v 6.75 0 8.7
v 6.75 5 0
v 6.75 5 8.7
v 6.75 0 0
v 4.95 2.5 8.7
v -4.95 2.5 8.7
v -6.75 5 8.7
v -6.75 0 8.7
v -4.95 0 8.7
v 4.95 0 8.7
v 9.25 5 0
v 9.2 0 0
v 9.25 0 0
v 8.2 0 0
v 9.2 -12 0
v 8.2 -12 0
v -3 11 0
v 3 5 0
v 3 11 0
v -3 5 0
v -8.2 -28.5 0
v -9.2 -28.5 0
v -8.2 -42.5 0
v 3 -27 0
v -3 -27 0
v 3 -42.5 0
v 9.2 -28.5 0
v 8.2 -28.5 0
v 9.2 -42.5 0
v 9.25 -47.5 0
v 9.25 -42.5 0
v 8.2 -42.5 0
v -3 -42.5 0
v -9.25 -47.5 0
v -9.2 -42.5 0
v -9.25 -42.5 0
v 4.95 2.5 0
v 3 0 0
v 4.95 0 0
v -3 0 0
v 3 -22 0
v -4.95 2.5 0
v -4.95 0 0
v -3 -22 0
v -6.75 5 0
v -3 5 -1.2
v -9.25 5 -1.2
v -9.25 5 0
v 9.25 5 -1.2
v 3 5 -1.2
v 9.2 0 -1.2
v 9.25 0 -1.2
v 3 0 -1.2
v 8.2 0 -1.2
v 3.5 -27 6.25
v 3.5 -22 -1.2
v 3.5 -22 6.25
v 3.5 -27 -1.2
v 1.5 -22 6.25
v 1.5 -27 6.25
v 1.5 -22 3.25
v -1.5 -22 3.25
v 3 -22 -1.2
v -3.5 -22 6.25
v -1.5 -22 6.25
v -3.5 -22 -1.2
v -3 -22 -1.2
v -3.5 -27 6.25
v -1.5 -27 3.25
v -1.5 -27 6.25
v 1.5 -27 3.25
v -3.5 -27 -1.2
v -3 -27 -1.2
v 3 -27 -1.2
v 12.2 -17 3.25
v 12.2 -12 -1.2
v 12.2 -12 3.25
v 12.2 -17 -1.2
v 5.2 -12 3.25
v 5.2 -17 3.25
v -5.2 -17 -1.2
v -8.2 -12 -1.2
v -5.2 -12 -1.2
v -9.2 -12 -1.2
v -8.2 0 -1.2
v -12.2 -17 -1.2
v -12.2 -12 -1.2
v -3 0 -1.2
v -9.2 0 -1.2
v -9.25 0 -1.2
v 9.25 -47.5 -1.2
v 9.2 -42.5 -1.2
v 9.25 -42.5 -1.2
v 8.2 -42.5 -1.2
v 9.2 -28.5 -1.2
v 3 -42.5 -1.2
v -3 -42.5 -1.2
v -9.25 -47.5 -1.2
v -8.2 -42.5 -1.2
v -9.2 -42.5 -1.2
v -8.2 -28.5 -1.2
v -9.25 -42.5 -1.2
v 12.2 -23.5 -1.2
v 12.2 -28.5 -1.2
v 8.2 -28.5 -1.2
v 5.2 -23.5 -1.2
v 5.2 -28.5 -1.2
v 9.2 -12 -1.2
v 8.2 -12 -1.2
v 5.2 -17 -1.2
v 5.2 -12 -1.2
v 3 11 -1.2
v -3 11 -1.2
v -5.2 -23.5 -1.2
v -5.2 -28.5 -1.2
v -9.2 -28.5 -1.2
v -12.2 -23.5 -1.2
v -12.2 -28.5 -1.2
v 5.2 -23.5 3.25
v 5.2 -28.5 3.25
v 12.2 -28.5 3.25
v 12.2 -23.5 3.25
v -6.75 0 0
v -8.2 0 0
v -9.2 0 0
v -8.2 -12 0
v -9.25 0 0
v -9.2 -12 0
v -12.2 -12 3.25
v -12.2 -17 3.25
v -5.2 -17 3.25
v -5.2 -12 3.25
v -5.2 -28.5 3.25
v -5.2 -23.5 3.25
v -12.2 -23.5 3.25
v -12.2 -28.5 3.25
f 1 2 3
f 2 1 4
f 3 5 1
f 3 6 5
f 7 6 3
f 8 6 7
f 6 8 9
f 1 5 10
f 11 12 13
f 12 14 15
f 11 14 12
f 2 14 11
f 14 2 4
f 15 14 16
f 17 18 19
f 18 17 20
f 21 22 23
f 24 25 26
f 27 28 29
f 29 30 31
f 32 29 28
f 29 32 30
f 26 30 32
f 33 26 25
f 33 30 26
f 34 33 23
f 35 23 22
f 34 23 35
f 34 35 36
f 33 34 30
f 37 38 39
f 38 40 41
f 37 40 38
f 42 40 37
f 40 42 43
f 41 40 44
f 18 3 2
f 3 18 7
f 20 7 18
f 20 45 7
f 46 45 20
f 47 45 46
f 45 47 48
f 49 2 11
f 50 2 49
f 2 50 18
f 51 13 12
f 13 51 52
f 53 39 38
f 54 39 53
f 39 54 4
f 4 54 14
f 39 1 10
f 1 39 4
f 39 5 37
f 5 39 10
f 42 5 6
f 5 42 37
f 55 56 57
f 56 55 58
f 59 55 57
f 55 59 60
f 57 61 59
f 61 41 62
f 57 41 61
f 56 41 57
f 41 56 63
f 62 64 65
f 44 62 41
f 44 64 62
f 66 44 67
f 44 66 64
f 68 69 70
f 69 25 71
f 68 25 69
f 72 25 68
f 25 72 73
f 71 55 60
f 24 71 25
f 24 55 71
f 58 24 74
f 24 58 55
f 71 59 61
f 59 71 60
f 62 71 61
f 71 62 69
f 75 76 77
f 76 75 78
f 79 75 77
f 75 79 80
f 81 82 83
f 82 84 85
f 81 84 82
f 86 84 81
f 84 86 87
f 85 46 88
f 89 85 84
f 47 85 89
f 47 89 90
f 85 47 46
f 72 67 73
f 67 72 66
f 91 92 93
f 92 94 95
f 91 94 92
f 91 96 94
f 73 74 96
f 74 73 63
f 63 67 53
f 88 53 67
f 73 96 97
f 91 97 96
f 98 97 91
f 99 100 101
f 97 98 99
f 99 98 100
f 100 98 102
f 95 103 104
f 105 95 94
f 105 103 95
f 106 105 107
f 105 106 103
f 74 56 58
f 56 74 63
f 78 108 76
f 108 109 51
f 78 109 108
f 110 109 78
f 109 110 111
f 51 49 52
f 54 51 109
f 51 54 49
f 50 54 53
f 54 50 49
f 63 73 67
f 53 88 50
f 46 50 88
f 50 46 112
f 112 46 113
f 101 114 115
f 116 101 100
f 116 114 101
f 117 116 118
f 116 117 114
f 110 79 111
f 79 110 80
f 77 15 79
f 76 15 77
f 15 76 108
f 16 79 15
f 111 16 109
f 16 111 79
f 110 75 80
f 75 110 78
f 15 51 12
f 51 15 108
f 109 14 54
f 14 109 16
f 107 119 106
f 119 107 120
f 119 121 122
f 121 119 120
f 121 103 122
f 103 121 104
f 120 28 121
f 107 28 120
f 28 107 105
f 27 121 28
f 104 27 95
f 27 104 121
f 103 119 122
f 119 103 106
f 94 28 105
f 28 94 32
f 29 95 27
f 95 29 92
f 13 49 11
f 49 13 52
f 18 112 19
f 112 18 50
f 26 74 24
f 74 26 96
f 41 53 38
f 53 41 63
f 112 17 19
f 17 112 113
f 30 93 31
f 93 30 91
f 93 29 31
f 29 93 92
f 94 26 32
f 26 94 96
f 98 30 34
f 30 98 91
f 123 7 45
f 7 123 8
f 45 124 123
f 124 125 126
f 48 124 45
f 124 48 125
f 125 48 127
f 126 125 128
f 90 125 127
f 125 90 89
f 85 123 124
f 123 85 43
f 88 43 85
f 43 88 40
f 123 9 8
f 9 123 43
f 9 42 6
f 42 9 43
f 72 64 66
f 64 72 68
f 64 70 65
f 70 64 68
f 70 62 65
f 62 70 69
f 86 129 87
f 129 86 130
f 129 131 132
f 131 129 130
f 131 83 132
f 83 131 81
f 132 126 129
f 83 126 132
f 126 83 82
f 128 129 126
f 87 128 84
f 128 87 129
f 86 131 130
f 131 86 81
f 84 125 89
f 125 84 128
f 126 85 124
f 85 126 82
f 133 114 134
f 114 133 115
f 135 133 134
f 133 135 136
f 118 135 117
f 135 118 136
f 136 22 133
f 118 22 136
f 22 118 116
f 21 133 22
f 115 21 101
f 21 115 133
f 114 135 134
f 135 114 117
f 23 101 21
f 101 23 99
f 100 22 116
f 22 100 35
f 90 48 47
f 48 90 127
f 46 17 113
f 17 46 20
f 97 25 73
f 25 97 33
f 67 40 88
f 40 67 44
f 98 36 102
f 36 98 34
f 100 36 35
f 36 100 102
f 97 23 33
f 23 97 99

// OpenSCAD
/* Pole holder centered on the holder */
module poleHolder(radius,headradius,pivotlength)
{
  translate(v=[-radius-2,-2.5,0])
  {
    difference()
    {
      translate(v=[0,0,-1.2])
        cube(size=[2*radius+4,5,headradius+radius+1.2]);
      translate(v=[2,0,headradius-radius])
        cube(size=[2*radius,5,2*radius]);
    }
  }

  translate(v=[-0.5,0,-1.2])
    cube(size=[1.0,pivotlength,0.8]);
}

/* Pole holder centered on the holder */
module poleHolderNoUpright(radius,headradius,pivotlength)
{
  translate(v=[-radius,-2.5,0])
  {
    translate(v=[-2,0,-1.2])
      cube(size=[2*radius+4,5,headradius-radius+1.2]);
  }

  translate(v=[-0.5,0,-1.2])
    cube(size=[1.0,pivotlength,1.2]);
}

module halfRelay(radius,headradius)
{
  /* Half a nail head holder */
  difference()
  {
    cube(size=[headradius+2,5,2*headradius-0.8]);

    cube(size=[headradius+0.2,2.5,2*headradius-0.8]);
  }

  translate(v=[0,0,-1.2])
    cube(size=[headradius+4.5,5,1.2]);

  translate(v=[0,-27,-1.2])
    cube(size=[3.5,5,1.2]);

  translate(v=[0,-43,-1.2])
    cube(size=[3,54,1.2]);

  translate(v=[0,-47.5,-1.2])
    cube(size=[headradius+4.5,5,1.2]);

  /* Half a nail stem holder */
  translate(v=[0,-27,0])
    difference()
    {
      cube(size=[radius+2,5,headradius+radius]);
      translate(v=[0,0,headradius-radius])
        cube(size=[radius,5,2*radius]);
    }

  translate(v=[8.7,-14.5,0])
    rotate([0,0,0])
      poleHolderNoUpright(radius,headradius,17);

  translate(v=[8.7,-26,0])
    rotate([0,0,180])
      poleHolderNoUpright(radius,headradius,17);
}

halfRelay(1.5,4.75);
mirror([1,0,0])
  halfRelay(1.5,4.75);
